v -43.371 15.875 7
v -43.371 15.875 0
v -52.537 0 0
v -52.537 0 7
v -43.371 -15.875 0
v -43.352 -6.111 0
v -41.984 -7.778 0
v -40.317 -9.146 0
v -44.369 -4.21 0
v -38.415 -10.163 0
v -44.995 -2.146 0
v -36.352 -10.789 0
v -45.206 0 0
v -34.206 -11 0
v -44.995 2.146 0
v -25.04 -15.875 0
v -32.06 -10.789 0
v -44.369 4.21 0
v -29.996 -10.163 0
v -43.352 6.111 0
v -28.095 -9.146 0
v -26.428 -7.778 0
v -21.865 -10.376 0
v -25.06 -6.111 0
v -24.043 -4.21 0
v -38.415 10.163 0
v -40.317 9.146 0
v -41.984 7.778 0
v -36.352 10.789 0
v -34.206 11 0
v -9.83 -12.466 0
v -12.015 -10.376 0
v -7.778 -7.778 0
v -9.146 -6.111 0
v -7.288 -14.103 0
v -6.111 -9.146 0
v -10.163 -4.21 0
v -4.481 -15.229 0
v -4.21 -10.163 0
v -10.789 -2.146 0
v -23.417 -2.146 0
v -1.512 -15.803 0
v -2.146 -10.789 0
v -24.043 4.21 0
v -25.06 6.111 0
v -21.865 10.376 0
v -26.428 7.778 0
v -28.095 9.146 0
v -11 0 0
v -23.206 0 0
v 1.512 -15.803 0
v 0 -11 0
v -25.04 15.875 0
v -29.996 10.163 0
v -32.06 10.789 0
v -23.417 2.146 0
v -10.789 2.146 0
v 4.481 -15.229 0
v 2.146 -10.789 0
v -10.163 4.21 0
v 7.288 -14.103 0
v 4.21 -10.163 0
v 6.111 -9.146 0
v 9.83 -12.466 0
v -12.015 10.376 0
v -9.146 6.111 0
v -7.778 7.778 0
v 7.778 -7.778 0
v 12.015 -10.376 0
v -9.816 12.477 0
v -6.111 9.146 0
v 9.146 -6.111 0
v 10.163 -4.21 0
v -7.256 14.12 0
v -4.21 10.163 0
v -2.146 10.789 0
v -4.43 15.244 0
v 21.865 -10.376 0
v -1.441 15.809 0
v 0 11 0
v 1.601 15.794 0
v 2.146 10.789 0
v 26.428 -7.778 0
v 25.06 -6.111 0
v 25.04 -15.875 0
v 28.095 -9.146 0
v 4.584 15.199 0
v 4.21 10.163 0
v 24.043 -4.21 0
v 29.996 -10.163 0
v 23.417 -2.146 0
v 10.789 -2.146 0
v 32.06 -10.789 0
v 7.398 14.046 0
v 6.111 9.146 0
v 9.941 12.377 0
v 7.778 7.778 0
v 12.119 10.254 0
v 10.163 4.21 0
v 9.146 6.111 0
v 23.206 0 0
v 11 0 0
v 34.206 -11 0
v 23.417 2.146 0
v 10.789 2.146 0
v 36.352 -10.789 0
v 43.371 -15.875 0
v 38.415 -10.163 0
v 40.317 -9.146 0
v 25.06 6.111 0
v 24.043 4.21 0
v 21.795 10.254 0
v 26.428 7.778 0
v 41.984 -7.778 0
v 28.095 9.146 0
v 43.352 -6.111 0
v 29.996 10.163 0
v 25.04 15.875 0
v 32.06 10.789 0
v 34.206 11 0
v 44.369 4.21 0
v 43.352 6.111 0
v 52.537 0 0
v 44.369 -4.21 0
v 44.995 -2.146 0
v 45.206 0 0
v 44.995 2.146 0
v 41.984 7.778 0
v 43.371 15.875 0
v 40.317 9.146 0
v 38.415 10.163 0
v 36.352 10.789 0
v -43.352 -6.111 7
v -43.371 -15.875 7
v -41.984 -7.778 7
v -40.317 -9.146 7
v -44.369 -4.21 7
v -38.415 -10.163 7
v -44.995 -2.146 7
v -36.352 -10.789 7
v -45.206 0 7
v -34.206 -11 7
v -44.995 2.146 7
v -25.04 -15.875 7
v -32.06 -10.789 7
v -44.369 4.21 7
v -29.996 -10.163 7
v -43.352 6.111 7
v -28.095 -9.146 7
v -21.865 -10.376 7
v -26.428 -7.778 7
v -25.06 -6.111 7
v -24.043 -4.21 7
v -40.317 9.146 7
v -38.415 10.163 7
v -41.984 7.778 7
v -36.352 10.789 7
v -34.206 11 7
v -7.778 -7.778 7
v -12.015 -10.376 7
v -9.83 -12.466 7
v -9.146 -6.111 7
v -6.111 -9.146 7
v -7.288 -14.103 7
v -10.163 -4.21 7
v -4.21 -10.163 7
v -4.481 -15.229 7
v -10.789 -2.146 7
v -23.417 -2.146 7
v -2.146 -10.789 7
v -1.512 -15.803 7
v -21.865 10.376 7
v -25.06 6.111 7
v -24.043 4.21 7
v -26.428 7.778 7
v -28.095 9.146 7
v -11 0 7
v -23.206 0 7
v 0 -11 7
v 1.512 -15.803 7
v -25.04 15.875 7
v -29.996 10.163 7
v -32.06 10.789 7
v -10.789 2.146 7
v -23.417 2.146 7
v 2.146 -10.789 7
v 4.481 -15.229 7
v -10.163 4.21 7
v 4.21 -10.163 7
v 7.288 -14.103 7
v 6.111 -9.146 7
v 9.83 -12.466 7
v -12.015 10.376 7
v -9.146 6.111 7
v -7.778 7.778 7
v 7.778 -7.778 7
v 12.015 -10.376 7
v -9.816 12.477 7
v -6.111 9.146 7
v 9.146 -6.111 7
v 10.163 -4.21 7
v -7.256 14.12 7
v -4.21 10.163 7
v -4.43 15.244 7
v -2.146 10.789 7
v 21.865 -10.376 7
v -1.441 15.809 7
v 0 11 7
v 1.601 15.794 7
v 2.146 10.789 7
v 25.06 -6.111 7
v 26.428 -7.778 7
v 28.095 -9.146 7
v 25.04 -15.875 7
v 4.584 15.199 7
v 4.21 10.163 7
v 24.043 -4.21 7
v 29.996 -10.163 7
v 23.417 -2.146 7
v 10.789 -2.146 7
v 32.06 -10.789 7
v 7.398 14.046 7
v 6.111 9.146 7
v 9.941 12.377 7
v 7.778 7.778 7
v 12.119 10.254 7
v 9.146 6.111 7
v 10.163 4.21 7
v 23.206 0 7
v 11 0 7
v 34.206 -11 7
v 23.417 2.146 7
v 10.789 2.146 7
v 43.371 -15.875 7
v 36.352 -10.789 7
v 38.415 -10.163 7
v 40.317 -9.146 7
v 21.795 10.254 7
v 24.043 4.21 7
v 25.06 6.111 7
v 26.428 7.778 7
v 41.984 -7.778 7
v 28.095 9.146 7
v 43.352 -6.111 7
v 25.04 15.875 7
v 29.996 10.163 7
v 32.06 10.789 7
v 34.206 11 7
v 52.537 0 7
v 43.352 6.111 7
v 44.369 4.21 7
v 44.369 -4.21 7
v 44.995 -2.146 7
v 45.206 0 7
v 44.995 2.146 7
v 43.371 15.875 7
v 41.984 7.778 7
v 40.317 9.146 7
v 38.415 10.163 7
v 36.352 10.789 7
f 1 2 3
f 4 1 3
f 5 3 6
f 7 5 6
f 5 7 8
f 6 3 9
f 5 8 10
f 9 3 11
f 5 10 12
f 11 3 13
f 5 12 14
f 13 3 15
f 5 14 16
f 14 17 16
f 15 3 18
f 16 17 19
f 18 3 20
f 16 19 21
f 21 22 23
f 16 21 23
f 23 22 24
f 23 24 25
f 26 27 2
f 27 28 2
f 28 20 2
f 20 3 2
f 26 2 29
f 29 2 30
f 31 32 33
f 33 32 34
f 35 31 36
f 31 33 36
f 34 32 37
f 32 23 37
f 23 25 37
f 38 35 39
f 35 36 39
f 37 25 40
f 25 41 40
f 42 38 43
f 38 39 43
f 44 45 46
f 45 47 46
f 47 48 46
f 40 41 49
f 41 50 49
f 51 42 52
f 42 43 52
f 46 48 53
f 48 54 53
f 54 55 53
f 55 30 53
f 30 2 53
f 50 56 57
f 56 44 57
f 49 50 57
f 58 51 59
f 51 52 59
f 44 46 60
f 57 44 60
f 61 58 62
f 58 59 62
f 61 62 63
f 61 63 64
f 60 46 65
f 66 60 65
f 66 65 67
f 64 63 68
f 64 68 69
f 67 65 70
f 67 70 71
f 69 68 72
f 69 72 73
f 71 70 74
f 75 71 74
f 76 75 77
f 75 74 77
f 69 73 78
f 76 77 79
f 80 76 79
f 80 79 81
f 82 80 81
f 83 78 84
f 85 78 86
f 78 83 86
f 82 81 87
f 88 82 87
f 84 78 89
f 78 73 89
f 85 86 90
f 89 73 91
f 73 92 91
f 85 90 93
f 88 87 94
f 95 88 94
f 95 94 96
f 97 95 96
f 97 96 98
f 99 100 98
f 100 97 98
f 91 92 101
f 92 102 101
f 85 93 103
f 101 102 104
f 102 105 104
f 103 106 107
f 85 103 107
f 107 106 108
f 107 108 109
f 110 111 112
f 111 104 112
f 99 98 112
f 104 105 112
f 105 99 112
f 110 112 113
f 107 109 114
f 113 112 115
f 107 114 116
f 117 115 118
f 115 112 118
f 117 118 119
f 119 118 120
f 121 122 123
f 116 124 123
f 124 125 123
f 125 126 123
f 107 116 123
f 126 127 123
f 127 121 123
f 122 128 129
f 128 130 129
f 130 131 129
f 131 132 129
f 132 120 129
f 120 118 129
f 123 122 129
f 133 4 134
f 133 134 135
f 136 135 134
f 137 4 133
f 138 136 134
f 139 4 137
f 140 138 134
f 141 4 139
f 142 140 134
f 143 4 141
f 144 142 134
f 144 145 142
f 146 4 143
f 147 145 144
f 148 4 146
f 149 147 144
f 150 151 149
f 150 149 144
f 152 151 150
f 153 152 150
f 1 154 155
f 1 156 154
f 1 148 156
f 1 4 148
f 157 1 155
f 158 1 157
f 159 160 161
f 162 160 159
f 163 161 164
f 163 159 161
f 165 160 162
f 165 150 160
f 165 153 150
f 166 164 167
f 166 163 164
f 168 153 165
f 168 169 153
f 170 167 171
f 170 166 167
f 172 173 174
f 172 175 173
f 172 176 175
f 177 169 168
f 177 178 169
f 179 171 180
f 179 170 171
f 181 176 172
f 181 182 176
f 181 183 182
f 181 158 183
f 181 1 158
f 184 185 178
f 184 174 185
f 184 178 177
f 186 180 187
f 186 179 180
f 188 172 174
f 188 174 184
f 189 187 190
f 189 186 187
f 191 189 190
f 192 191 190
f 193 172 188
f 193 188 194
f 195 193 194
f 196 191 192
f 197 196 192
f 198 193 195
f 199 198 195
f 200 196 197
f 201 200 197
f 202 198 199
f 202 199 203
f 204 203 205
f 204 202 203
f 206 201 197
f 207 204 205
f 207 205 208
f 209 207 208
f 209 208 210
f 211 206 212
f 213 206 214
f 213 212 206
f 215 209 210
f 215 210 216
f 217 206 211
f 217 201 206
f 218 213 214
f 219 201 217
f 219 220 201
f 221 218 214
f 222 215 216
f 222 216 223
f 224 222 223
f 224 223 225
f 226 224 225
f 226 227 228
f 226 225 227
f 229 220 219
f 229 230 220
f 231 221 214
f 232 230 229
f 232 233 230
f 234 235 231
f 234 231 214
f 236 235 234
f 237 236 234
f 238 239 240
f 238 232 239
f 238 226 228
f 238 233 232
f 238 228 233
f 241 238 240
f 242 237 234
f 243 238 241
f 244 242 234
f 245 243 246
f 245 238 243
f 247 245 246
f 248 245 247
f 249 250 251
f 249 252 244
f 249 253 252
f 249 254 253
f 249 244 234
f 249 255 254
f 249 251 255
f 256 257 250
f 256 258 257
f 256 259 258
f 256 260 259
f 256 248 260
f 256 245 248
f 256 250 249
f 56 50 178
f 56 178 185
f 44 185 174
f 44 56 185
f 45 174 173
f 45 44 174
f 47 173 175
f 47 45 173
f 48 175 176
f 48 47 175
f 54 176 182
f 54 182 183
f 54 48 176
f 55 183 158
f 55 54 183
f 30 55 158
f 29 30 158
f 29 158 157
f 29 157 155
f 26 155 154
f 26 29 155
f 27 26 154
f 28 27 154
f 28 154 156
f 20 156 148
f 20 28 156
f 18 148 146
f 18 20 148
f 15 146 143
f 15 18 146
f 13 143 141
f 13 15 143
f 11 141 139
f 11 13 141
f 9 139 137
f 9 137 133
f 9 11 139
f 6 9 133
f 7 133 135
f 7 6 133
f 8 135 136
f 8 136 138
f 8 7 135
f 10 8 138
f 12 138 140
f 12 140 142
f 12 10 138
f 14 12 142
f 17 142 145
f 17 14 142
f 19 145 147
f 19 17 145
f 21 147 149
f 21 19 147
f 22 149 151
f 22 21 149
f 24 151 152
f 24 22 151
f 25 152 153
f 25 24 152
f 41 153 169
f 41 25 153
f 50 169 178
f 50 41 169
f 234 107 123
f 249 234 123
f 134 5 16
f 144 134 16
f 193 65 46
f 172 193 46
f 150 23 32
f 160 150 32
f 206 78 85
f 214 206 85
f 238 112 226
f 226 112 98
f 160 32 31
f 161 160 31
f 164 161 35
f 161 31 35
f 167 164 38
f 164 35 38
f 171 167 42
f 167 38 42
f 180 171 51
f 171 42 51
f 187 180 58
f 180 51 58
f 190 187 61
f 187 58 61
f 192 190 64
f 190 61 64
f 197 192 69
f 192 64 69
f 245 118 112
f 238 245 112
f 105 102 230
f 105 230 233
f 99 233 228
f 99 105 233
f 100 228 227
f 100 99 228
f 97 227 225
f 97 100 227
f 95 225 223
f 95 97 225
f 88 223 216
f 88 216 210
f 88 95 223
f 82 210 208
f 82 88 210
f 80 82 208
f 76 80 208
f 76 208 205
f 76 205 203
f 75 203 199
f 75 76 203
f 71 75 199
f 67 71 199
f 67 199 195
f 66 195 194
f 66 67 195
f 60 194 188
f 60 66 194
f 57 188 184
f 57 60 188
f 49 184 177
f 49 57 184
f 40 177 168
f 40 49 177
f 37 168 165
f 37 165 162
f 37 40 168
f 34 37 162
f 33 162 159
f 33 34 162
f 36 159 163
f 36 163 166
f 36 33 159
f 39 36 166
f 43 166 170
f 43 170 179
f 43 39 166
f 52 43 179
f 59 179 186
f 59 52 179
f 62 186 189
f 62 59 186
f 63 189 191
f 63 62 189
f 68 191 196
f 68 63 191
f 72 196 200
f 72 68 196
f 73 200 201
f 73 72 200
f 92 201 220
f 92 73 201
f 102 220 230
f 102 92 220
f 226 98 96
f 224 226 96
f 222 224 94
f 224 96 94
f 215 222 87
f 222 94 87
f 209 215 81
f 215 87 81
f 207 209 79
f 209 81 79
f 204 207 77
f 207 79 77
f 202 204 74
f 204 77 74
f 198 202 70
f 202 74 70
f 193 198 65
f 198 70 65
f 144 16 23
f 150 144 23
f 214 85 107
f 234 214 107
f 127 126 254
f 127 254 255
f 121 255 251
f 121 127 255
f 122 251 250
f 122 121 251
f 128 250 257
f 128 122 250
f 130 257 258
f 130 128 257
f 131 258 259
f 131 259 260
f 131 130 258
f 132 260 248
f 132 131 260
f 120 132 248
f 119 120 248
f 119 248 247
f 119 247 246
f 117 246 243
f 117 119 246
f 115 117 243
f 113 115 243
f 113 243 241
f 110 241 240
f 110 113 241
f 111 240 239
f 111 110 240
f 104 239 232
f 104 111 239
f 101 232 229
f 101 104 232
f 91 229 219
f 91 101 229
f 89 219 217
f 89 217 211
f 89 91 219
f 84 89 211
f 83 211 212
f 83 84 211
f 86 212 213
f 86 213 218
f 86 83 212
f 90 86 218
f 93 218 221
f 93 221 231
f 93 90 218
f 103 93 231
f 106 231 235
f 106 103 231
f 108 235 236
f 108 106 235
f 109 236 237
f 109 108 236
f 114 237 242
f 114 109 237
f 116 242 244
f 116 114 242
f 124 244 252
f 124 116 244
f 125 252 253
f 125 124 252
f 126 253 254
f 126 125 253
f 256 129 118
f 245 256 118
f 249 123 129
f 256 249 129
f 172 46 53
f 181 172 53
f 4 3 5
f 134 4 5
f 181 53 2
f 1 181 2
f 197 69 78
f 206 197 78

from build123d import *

# Parameters (mm, degrees)
F0_R     = 11
F1_DEPTH = 7


with BuildPart() as f1:
    # F0 (on Top) → F1 (new body)
    with BuildSketch(Plane.XY):
        Polygon((-21.865436, -10.375739), (-15.875, 0), (-21.865436, 10.375739), (-25.040436, 15.875), (-43.371307, 15.875), (-52.536742, 0), (-43.371307, -15.875), (-25.040436, -15.875), align=None)
        with Locations((-34.205871, 0)):
            Circle(F0_R, mode=Mode.SUBTRACT)
        with BuildLine():
            ThreePointArc((-12.014977, 10.375739), (-14.878733, 5.535245), (-15.875, 0))
            ThreePointArc((-15.875, 0), (-14.878733, -5.535245), (-12.014977, -10.375739))
            ThreePointArc((-12.014977, -10.375739), (0, -15.875), (12.014977, -10.375739))
            ThreePointArc((12.014977, -10.375739), (14.878733, -5.535245), (15.875, 0))
            ThreePointArc((15.875, 0), (14.906507, 5.460006), (12.1192, 10.25381))
            ThreePointArc((12.1192, 10.25381), (0.080201, 15.874797), (-12.014977, 10.375739))
        make_face()
        Circle(F0_R, mode=Mode.SUBTRACT)
        with BuildLine():
            Line((-21.865436, 10.375739), (-15.875, 0))
            ThreePointArc((-15.875, 0), (-14.878733, 5.535245), (-12.014977, 10.375739))
            Line((-12.014977, 10.375739), (-21.865436, 10.375739))
        make_face()
        with BuildLine():
            ThreePointArc((-12.014977, -10.375739), (-14.878733, -5.535245), (-15.875, 0))
            Line((-15.875, 0), (-21.865436, -10.375739))
            Line((-21.865436, -10.375739), (-12.014977, -10.375739))
        make_face()
        with BuildLine():
            ThreePointArc((15.875, 0), (14.878733, -5.535245), (12.014977, -10.375739))
            Line((12.014977, -10.375739), (21.865436, -10.375739))
            Line((21.865436, -10.375739), (15.875, 0))
        make_face()
        with BuildLine():
            Line((21.79504, 10.25381), (12.1192, 10.25381))
            ThreePointArc((12.1192, 10.25381), (14.906507, 5.460006), (15.875, 0))
            Line((15.875, 0), (21.79504, 10.25381))
        make_face()
        Polygon((21.79504, 10.25381), (15.875, 0), (21.865436, -10.375739), (25.040436, -15.875), (43.371307, -15.875), (52.536742, 0), (43.371307, 15.875), (25.040436, 15.875), align=None)
        with Locations((34.205871, 0)):
            Circle(F0_R, mode=Mode.SUBTRACT)
    extrude(amount=F1_DEPTH)


solid = f1.part
